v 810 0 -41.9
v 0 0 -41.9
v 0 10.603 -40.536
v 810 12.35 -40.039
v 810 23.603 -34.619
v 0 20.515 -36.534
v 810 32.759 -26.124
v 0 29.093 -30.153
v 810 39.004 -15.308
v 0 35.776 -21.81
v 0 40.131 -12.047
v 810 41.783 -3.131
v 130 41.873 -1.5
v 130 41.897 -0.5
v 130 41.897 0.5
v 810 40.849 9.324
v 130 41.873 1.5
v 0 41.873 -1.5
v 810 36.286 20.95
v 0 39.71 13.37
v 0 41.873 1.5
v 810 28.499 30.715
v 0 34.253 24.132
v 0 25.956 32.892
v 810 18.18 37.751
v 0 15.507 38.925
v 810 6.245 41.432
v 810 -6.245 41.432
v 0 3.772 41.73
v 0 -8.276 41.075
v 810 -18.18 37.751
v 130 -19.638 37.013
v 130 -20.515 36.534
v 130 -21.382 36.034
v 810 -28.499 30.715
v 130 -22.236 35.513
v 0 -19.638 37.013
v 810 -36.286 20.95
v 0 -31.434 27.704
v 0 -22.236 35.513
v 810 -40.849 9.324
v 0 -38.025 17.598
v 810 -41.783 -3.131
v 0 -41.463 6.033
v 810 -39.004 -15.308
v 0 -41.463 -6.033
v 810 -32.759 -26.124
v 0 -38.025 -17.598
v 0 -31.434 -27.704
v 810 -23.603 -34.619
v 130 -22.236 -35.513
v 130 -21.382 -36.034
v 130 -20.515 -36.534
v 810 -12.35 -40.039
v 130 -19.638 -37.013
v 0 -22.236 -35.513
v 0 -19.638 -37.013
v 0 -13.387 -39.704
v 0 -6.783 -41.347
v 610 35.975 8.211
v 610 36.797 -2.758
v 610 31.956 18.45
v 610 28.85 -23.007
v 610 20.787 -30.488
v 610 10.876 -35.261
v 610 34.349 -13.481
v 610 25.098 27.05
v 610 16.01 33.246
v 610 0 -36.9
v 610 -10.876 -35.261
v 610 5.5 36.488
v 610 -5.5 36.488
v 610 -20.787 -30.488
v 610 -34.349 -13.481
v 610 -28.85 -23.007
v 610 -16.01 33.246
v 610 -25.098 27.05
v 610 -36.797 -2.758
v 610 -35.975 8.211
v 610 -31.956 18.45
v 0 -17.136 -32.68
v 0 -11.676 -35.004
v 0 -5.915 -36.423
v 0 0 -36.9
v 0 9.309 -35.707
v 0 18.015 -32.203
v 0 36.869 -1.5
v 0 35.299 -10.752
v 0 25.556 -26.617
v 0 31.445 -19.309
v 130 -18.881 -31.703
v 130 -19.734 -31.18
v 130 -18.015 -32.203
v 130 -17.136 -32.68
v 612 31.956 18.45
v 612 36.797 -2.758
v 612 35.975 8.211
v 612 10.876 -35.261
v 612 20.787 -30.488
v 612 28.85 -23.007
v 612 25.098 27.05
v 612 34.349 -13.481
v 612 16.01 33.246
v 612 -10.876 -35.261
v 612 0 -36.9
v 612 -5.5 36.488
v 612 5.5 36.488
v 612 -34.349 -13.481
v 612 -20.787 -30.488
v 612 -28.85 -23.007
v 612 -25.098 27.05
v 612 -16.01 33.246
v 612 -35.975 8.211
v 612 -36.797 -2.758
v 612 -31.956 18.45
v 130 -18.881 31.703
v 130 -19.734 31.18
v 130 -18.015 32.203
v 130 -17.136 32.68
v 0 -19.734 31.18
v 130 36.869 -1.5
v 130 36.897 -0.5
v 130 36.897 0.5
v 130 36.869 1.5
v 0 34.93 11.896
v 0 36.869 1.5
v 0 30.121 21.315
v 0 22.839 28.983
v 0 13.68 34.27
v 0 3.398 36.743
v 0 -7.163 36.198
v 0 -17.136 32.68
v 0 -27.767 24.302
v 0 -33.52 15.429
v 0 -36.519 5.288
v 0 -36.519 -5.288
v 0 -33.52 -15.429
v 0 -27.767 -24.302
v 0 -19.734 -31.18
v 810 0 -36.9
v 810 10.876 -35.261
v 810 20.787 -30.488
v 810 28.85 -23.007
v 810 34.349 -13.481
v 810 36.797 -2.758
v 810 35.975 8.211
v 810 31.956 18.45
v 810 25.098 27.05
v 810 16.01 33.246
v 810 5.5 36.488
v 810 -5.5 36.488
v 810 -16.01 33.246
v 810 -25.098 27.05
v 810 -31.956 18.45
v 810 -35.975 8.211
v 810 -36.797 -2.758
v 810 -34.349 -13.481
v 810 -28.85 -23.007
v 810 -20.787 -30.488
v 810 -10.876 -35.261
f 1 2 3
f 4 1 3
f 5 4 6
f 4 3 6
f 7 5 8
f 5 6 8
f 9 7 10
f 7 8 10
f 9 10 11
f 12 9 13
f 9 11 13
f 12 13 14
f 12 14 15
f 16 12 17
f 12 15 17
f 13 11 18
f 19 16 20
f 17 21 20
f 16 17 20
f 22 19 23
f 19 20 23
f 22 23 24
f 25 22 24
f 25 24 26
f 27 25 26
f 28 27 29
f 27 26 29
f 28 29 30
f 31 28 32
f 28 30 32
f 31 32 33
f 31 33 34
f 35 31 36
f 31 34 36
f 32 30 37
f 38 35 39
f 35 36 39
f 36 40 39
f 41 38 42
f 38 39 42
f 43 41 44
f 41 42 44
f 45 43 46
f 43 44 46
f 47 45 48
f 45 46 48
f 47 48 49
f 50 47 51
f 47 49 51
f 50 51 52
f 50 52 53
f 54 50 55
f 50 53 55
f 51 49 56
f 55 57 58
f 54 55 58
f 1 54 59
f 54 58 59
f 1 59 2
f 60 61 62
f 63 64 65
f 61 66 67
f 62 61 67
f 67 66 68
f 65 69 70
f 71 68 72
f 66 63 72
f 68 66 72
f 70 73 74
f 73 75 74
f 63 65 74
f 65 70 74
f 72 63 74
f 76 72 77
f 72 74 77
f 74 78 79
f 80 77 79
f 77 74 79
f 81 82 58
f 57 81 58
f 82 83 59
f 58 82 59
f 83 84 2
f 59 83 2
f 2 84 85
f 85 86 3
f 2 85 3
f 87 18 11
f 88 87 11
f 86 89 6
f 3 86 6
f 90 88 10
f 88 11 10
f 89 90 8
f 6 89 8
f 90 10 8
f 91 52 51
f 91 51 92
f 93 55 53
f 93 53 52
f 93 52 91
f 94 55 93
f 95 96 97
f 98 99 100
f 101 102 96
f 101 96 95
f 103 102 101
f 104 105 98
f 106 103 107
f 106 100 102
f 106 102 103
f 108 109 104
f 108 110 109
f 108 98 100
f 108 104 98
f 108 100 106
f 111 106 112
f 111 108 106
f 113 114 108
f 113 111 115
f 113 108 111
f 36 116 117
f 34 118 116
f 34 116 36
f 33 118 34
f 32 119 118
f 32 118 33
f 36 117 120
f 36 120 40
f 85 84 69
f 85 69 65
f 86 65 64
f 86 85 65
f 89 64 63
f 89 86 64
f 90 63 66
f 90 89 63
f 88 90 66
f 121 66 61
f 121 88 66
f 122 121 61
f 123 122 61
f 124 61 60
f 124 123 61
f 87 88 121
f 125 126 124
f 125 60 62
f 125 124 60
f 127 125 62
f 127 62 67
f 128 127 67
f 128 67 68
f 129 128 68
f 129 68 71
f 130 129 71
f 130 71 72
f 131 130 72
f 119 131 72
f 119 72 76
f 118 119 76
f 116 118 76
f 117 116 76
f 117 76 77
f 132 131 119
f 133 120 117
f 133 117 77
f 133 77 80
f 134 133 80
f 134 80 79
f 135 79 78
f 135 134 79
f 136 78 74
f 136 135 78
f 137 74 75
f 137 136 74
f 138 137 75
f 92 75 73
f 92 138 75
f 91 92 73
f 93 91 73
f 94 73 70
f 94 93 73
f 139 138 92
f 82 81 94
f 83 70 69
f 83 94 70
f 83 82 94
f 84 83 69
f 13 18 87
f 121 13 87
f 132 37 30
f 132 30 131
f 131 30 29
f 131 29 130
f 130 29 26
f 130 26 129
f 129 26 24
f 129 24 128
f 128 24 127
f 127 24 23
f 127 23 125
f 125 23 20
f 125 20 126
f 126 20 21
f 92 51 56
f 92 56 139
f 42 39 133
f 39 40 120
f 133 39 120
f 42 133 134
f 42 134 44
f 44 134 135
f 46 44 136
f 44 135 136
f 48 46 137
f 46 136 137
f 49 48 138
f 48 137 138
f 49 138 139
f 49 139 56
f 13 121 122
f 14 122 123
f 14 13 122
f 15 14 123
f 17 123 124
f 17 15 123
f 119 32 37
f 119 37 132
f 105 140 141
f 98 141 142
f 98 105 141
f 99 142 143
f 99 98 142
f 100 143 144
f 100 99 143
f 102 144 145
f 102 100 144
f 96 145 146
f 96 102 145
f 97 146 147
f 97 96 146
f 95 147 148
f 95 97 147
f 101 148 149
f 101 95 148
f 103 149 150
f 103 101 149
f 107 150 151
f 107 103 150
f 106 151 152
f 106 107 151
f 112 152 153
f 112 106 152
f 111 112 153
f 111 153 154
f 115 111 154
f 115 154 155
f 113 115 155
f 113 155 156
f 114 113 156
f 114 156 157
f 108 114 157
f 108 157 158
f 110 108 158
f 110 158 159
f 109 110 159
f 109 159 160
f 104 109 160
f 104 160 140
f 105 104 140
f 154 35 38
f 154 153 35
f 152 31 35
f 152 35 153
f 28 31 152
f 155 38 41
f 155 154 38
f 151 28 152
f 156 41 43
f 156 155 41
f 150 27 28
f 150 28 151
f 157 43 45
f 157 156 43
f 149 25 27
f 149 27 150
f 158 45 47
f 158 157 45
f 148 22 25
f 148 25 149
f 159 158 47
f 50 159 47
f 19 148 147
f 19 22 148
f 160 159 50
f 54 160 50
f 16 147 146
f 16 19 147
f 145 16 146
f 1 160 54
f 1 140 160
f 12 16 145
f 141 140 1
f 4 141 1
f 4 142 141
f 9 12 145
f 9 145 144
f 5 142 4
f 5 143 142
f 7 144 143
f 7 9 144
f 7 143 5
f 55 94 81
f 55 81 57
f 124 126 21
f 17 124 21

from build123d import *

# Parameters (mm, degrees)
SKETCH1_R               = 41.9
SKETCH1_R_2             = 36.9
BOSS_EXTRUDE1_DEPTH     = 810
CUT_EXTRUDE_THIN1_START = -130
CUT_EXTRUDE_THIN1_DEPTH = 130
SKETCH3_R               = 36.9
BOSS_EXTRUDE2_DEPTH     = 2


# Read off the part's stored shape, not the designer's step: Cut-Extrude-Thin1
with BuildPart() as part:
    # Sketch1 → Boss-Extrude1 (new body)
    with BuildSketch(Plane(origin=(0, 0, 0), x_dir=(0, 0, -1), z_dir=(1, 0, 0))):
        Circle(SKETCH1_R)
        Circle(SKETCH1_R_2, mode=Mode.SUBTRACT)
    extrude(amount=BOSS_EXTRUDE1_DEPTH)

    # Cut-Extrude-Thin1 outline → Cut-Extrude-Thin1 (cut)
    with BuildSketch(Plane.ZY.offset(CUT_EXTRUDE_THIN1_START)):
        with BuildLine():
            ThreePointArc((-31.179923269, -19.733787901), (-31.9563374, -18.45), (-32.67992327, -17.135711689))
            Line((-32.67992327, -17.135711689), (-37.013204492, -19.637532769))
            ThreePointArc((-37.013204492, -19.637532769), (-36.286464419, -20.95), (-35.513204492, -22.235608981))
            Line((-35.513204492, -22.235608981), (-31.179923269, -19.733787901))
        make_face()
        with BuildLine():
            Line((-1.5, 41.87314175), (-1.5, 36.86949959))
            ThreePointArc((-1.5, 36.86949959), (0, 36.9), (1.5, 36.86949959))
            Line((1.5, 36.86949959), (1.5, 41.87314175))
            ThreePointArc((1.5, 41.87314175), (0, 41.9), (-1.5, 41.87314175))
        make_face()
        with BuildLine():
            ThreePointArc((32.67992327, -17.135711689), (31.9563374, -18.45), (31.179923269, -19.733787901))
            Line((31.179923269, -19.733787901), (35.513204492, -22.235608981))
            ThreePointArc((35.513204492, -22.235608981), (36.286464419, -20.95), (37.013204492, -19.637532769))
            Line((37.013204492, -19.637532769), (32.67992327, -17.135711689))
        make_face()
    extrude(amount=CUT_EXTRUDE_THIN1_DEPTH, mode=Mode.SUBTRACT)

    # Sketch3 → Boss-Extrude2 (add)
    with BuildSketch(Plane(origin=(610, 0, 0), x_dir=(0, 0, -1), z_dir=(1, 0, 0))):
        with Locations(Location((0, 0, 0), (0, 0, 207.67026134))):
            Circle(SKETCH3_R)
    extrude(amount=BOSS_EXTRUDE2_DEPTH)


solid = part.part
